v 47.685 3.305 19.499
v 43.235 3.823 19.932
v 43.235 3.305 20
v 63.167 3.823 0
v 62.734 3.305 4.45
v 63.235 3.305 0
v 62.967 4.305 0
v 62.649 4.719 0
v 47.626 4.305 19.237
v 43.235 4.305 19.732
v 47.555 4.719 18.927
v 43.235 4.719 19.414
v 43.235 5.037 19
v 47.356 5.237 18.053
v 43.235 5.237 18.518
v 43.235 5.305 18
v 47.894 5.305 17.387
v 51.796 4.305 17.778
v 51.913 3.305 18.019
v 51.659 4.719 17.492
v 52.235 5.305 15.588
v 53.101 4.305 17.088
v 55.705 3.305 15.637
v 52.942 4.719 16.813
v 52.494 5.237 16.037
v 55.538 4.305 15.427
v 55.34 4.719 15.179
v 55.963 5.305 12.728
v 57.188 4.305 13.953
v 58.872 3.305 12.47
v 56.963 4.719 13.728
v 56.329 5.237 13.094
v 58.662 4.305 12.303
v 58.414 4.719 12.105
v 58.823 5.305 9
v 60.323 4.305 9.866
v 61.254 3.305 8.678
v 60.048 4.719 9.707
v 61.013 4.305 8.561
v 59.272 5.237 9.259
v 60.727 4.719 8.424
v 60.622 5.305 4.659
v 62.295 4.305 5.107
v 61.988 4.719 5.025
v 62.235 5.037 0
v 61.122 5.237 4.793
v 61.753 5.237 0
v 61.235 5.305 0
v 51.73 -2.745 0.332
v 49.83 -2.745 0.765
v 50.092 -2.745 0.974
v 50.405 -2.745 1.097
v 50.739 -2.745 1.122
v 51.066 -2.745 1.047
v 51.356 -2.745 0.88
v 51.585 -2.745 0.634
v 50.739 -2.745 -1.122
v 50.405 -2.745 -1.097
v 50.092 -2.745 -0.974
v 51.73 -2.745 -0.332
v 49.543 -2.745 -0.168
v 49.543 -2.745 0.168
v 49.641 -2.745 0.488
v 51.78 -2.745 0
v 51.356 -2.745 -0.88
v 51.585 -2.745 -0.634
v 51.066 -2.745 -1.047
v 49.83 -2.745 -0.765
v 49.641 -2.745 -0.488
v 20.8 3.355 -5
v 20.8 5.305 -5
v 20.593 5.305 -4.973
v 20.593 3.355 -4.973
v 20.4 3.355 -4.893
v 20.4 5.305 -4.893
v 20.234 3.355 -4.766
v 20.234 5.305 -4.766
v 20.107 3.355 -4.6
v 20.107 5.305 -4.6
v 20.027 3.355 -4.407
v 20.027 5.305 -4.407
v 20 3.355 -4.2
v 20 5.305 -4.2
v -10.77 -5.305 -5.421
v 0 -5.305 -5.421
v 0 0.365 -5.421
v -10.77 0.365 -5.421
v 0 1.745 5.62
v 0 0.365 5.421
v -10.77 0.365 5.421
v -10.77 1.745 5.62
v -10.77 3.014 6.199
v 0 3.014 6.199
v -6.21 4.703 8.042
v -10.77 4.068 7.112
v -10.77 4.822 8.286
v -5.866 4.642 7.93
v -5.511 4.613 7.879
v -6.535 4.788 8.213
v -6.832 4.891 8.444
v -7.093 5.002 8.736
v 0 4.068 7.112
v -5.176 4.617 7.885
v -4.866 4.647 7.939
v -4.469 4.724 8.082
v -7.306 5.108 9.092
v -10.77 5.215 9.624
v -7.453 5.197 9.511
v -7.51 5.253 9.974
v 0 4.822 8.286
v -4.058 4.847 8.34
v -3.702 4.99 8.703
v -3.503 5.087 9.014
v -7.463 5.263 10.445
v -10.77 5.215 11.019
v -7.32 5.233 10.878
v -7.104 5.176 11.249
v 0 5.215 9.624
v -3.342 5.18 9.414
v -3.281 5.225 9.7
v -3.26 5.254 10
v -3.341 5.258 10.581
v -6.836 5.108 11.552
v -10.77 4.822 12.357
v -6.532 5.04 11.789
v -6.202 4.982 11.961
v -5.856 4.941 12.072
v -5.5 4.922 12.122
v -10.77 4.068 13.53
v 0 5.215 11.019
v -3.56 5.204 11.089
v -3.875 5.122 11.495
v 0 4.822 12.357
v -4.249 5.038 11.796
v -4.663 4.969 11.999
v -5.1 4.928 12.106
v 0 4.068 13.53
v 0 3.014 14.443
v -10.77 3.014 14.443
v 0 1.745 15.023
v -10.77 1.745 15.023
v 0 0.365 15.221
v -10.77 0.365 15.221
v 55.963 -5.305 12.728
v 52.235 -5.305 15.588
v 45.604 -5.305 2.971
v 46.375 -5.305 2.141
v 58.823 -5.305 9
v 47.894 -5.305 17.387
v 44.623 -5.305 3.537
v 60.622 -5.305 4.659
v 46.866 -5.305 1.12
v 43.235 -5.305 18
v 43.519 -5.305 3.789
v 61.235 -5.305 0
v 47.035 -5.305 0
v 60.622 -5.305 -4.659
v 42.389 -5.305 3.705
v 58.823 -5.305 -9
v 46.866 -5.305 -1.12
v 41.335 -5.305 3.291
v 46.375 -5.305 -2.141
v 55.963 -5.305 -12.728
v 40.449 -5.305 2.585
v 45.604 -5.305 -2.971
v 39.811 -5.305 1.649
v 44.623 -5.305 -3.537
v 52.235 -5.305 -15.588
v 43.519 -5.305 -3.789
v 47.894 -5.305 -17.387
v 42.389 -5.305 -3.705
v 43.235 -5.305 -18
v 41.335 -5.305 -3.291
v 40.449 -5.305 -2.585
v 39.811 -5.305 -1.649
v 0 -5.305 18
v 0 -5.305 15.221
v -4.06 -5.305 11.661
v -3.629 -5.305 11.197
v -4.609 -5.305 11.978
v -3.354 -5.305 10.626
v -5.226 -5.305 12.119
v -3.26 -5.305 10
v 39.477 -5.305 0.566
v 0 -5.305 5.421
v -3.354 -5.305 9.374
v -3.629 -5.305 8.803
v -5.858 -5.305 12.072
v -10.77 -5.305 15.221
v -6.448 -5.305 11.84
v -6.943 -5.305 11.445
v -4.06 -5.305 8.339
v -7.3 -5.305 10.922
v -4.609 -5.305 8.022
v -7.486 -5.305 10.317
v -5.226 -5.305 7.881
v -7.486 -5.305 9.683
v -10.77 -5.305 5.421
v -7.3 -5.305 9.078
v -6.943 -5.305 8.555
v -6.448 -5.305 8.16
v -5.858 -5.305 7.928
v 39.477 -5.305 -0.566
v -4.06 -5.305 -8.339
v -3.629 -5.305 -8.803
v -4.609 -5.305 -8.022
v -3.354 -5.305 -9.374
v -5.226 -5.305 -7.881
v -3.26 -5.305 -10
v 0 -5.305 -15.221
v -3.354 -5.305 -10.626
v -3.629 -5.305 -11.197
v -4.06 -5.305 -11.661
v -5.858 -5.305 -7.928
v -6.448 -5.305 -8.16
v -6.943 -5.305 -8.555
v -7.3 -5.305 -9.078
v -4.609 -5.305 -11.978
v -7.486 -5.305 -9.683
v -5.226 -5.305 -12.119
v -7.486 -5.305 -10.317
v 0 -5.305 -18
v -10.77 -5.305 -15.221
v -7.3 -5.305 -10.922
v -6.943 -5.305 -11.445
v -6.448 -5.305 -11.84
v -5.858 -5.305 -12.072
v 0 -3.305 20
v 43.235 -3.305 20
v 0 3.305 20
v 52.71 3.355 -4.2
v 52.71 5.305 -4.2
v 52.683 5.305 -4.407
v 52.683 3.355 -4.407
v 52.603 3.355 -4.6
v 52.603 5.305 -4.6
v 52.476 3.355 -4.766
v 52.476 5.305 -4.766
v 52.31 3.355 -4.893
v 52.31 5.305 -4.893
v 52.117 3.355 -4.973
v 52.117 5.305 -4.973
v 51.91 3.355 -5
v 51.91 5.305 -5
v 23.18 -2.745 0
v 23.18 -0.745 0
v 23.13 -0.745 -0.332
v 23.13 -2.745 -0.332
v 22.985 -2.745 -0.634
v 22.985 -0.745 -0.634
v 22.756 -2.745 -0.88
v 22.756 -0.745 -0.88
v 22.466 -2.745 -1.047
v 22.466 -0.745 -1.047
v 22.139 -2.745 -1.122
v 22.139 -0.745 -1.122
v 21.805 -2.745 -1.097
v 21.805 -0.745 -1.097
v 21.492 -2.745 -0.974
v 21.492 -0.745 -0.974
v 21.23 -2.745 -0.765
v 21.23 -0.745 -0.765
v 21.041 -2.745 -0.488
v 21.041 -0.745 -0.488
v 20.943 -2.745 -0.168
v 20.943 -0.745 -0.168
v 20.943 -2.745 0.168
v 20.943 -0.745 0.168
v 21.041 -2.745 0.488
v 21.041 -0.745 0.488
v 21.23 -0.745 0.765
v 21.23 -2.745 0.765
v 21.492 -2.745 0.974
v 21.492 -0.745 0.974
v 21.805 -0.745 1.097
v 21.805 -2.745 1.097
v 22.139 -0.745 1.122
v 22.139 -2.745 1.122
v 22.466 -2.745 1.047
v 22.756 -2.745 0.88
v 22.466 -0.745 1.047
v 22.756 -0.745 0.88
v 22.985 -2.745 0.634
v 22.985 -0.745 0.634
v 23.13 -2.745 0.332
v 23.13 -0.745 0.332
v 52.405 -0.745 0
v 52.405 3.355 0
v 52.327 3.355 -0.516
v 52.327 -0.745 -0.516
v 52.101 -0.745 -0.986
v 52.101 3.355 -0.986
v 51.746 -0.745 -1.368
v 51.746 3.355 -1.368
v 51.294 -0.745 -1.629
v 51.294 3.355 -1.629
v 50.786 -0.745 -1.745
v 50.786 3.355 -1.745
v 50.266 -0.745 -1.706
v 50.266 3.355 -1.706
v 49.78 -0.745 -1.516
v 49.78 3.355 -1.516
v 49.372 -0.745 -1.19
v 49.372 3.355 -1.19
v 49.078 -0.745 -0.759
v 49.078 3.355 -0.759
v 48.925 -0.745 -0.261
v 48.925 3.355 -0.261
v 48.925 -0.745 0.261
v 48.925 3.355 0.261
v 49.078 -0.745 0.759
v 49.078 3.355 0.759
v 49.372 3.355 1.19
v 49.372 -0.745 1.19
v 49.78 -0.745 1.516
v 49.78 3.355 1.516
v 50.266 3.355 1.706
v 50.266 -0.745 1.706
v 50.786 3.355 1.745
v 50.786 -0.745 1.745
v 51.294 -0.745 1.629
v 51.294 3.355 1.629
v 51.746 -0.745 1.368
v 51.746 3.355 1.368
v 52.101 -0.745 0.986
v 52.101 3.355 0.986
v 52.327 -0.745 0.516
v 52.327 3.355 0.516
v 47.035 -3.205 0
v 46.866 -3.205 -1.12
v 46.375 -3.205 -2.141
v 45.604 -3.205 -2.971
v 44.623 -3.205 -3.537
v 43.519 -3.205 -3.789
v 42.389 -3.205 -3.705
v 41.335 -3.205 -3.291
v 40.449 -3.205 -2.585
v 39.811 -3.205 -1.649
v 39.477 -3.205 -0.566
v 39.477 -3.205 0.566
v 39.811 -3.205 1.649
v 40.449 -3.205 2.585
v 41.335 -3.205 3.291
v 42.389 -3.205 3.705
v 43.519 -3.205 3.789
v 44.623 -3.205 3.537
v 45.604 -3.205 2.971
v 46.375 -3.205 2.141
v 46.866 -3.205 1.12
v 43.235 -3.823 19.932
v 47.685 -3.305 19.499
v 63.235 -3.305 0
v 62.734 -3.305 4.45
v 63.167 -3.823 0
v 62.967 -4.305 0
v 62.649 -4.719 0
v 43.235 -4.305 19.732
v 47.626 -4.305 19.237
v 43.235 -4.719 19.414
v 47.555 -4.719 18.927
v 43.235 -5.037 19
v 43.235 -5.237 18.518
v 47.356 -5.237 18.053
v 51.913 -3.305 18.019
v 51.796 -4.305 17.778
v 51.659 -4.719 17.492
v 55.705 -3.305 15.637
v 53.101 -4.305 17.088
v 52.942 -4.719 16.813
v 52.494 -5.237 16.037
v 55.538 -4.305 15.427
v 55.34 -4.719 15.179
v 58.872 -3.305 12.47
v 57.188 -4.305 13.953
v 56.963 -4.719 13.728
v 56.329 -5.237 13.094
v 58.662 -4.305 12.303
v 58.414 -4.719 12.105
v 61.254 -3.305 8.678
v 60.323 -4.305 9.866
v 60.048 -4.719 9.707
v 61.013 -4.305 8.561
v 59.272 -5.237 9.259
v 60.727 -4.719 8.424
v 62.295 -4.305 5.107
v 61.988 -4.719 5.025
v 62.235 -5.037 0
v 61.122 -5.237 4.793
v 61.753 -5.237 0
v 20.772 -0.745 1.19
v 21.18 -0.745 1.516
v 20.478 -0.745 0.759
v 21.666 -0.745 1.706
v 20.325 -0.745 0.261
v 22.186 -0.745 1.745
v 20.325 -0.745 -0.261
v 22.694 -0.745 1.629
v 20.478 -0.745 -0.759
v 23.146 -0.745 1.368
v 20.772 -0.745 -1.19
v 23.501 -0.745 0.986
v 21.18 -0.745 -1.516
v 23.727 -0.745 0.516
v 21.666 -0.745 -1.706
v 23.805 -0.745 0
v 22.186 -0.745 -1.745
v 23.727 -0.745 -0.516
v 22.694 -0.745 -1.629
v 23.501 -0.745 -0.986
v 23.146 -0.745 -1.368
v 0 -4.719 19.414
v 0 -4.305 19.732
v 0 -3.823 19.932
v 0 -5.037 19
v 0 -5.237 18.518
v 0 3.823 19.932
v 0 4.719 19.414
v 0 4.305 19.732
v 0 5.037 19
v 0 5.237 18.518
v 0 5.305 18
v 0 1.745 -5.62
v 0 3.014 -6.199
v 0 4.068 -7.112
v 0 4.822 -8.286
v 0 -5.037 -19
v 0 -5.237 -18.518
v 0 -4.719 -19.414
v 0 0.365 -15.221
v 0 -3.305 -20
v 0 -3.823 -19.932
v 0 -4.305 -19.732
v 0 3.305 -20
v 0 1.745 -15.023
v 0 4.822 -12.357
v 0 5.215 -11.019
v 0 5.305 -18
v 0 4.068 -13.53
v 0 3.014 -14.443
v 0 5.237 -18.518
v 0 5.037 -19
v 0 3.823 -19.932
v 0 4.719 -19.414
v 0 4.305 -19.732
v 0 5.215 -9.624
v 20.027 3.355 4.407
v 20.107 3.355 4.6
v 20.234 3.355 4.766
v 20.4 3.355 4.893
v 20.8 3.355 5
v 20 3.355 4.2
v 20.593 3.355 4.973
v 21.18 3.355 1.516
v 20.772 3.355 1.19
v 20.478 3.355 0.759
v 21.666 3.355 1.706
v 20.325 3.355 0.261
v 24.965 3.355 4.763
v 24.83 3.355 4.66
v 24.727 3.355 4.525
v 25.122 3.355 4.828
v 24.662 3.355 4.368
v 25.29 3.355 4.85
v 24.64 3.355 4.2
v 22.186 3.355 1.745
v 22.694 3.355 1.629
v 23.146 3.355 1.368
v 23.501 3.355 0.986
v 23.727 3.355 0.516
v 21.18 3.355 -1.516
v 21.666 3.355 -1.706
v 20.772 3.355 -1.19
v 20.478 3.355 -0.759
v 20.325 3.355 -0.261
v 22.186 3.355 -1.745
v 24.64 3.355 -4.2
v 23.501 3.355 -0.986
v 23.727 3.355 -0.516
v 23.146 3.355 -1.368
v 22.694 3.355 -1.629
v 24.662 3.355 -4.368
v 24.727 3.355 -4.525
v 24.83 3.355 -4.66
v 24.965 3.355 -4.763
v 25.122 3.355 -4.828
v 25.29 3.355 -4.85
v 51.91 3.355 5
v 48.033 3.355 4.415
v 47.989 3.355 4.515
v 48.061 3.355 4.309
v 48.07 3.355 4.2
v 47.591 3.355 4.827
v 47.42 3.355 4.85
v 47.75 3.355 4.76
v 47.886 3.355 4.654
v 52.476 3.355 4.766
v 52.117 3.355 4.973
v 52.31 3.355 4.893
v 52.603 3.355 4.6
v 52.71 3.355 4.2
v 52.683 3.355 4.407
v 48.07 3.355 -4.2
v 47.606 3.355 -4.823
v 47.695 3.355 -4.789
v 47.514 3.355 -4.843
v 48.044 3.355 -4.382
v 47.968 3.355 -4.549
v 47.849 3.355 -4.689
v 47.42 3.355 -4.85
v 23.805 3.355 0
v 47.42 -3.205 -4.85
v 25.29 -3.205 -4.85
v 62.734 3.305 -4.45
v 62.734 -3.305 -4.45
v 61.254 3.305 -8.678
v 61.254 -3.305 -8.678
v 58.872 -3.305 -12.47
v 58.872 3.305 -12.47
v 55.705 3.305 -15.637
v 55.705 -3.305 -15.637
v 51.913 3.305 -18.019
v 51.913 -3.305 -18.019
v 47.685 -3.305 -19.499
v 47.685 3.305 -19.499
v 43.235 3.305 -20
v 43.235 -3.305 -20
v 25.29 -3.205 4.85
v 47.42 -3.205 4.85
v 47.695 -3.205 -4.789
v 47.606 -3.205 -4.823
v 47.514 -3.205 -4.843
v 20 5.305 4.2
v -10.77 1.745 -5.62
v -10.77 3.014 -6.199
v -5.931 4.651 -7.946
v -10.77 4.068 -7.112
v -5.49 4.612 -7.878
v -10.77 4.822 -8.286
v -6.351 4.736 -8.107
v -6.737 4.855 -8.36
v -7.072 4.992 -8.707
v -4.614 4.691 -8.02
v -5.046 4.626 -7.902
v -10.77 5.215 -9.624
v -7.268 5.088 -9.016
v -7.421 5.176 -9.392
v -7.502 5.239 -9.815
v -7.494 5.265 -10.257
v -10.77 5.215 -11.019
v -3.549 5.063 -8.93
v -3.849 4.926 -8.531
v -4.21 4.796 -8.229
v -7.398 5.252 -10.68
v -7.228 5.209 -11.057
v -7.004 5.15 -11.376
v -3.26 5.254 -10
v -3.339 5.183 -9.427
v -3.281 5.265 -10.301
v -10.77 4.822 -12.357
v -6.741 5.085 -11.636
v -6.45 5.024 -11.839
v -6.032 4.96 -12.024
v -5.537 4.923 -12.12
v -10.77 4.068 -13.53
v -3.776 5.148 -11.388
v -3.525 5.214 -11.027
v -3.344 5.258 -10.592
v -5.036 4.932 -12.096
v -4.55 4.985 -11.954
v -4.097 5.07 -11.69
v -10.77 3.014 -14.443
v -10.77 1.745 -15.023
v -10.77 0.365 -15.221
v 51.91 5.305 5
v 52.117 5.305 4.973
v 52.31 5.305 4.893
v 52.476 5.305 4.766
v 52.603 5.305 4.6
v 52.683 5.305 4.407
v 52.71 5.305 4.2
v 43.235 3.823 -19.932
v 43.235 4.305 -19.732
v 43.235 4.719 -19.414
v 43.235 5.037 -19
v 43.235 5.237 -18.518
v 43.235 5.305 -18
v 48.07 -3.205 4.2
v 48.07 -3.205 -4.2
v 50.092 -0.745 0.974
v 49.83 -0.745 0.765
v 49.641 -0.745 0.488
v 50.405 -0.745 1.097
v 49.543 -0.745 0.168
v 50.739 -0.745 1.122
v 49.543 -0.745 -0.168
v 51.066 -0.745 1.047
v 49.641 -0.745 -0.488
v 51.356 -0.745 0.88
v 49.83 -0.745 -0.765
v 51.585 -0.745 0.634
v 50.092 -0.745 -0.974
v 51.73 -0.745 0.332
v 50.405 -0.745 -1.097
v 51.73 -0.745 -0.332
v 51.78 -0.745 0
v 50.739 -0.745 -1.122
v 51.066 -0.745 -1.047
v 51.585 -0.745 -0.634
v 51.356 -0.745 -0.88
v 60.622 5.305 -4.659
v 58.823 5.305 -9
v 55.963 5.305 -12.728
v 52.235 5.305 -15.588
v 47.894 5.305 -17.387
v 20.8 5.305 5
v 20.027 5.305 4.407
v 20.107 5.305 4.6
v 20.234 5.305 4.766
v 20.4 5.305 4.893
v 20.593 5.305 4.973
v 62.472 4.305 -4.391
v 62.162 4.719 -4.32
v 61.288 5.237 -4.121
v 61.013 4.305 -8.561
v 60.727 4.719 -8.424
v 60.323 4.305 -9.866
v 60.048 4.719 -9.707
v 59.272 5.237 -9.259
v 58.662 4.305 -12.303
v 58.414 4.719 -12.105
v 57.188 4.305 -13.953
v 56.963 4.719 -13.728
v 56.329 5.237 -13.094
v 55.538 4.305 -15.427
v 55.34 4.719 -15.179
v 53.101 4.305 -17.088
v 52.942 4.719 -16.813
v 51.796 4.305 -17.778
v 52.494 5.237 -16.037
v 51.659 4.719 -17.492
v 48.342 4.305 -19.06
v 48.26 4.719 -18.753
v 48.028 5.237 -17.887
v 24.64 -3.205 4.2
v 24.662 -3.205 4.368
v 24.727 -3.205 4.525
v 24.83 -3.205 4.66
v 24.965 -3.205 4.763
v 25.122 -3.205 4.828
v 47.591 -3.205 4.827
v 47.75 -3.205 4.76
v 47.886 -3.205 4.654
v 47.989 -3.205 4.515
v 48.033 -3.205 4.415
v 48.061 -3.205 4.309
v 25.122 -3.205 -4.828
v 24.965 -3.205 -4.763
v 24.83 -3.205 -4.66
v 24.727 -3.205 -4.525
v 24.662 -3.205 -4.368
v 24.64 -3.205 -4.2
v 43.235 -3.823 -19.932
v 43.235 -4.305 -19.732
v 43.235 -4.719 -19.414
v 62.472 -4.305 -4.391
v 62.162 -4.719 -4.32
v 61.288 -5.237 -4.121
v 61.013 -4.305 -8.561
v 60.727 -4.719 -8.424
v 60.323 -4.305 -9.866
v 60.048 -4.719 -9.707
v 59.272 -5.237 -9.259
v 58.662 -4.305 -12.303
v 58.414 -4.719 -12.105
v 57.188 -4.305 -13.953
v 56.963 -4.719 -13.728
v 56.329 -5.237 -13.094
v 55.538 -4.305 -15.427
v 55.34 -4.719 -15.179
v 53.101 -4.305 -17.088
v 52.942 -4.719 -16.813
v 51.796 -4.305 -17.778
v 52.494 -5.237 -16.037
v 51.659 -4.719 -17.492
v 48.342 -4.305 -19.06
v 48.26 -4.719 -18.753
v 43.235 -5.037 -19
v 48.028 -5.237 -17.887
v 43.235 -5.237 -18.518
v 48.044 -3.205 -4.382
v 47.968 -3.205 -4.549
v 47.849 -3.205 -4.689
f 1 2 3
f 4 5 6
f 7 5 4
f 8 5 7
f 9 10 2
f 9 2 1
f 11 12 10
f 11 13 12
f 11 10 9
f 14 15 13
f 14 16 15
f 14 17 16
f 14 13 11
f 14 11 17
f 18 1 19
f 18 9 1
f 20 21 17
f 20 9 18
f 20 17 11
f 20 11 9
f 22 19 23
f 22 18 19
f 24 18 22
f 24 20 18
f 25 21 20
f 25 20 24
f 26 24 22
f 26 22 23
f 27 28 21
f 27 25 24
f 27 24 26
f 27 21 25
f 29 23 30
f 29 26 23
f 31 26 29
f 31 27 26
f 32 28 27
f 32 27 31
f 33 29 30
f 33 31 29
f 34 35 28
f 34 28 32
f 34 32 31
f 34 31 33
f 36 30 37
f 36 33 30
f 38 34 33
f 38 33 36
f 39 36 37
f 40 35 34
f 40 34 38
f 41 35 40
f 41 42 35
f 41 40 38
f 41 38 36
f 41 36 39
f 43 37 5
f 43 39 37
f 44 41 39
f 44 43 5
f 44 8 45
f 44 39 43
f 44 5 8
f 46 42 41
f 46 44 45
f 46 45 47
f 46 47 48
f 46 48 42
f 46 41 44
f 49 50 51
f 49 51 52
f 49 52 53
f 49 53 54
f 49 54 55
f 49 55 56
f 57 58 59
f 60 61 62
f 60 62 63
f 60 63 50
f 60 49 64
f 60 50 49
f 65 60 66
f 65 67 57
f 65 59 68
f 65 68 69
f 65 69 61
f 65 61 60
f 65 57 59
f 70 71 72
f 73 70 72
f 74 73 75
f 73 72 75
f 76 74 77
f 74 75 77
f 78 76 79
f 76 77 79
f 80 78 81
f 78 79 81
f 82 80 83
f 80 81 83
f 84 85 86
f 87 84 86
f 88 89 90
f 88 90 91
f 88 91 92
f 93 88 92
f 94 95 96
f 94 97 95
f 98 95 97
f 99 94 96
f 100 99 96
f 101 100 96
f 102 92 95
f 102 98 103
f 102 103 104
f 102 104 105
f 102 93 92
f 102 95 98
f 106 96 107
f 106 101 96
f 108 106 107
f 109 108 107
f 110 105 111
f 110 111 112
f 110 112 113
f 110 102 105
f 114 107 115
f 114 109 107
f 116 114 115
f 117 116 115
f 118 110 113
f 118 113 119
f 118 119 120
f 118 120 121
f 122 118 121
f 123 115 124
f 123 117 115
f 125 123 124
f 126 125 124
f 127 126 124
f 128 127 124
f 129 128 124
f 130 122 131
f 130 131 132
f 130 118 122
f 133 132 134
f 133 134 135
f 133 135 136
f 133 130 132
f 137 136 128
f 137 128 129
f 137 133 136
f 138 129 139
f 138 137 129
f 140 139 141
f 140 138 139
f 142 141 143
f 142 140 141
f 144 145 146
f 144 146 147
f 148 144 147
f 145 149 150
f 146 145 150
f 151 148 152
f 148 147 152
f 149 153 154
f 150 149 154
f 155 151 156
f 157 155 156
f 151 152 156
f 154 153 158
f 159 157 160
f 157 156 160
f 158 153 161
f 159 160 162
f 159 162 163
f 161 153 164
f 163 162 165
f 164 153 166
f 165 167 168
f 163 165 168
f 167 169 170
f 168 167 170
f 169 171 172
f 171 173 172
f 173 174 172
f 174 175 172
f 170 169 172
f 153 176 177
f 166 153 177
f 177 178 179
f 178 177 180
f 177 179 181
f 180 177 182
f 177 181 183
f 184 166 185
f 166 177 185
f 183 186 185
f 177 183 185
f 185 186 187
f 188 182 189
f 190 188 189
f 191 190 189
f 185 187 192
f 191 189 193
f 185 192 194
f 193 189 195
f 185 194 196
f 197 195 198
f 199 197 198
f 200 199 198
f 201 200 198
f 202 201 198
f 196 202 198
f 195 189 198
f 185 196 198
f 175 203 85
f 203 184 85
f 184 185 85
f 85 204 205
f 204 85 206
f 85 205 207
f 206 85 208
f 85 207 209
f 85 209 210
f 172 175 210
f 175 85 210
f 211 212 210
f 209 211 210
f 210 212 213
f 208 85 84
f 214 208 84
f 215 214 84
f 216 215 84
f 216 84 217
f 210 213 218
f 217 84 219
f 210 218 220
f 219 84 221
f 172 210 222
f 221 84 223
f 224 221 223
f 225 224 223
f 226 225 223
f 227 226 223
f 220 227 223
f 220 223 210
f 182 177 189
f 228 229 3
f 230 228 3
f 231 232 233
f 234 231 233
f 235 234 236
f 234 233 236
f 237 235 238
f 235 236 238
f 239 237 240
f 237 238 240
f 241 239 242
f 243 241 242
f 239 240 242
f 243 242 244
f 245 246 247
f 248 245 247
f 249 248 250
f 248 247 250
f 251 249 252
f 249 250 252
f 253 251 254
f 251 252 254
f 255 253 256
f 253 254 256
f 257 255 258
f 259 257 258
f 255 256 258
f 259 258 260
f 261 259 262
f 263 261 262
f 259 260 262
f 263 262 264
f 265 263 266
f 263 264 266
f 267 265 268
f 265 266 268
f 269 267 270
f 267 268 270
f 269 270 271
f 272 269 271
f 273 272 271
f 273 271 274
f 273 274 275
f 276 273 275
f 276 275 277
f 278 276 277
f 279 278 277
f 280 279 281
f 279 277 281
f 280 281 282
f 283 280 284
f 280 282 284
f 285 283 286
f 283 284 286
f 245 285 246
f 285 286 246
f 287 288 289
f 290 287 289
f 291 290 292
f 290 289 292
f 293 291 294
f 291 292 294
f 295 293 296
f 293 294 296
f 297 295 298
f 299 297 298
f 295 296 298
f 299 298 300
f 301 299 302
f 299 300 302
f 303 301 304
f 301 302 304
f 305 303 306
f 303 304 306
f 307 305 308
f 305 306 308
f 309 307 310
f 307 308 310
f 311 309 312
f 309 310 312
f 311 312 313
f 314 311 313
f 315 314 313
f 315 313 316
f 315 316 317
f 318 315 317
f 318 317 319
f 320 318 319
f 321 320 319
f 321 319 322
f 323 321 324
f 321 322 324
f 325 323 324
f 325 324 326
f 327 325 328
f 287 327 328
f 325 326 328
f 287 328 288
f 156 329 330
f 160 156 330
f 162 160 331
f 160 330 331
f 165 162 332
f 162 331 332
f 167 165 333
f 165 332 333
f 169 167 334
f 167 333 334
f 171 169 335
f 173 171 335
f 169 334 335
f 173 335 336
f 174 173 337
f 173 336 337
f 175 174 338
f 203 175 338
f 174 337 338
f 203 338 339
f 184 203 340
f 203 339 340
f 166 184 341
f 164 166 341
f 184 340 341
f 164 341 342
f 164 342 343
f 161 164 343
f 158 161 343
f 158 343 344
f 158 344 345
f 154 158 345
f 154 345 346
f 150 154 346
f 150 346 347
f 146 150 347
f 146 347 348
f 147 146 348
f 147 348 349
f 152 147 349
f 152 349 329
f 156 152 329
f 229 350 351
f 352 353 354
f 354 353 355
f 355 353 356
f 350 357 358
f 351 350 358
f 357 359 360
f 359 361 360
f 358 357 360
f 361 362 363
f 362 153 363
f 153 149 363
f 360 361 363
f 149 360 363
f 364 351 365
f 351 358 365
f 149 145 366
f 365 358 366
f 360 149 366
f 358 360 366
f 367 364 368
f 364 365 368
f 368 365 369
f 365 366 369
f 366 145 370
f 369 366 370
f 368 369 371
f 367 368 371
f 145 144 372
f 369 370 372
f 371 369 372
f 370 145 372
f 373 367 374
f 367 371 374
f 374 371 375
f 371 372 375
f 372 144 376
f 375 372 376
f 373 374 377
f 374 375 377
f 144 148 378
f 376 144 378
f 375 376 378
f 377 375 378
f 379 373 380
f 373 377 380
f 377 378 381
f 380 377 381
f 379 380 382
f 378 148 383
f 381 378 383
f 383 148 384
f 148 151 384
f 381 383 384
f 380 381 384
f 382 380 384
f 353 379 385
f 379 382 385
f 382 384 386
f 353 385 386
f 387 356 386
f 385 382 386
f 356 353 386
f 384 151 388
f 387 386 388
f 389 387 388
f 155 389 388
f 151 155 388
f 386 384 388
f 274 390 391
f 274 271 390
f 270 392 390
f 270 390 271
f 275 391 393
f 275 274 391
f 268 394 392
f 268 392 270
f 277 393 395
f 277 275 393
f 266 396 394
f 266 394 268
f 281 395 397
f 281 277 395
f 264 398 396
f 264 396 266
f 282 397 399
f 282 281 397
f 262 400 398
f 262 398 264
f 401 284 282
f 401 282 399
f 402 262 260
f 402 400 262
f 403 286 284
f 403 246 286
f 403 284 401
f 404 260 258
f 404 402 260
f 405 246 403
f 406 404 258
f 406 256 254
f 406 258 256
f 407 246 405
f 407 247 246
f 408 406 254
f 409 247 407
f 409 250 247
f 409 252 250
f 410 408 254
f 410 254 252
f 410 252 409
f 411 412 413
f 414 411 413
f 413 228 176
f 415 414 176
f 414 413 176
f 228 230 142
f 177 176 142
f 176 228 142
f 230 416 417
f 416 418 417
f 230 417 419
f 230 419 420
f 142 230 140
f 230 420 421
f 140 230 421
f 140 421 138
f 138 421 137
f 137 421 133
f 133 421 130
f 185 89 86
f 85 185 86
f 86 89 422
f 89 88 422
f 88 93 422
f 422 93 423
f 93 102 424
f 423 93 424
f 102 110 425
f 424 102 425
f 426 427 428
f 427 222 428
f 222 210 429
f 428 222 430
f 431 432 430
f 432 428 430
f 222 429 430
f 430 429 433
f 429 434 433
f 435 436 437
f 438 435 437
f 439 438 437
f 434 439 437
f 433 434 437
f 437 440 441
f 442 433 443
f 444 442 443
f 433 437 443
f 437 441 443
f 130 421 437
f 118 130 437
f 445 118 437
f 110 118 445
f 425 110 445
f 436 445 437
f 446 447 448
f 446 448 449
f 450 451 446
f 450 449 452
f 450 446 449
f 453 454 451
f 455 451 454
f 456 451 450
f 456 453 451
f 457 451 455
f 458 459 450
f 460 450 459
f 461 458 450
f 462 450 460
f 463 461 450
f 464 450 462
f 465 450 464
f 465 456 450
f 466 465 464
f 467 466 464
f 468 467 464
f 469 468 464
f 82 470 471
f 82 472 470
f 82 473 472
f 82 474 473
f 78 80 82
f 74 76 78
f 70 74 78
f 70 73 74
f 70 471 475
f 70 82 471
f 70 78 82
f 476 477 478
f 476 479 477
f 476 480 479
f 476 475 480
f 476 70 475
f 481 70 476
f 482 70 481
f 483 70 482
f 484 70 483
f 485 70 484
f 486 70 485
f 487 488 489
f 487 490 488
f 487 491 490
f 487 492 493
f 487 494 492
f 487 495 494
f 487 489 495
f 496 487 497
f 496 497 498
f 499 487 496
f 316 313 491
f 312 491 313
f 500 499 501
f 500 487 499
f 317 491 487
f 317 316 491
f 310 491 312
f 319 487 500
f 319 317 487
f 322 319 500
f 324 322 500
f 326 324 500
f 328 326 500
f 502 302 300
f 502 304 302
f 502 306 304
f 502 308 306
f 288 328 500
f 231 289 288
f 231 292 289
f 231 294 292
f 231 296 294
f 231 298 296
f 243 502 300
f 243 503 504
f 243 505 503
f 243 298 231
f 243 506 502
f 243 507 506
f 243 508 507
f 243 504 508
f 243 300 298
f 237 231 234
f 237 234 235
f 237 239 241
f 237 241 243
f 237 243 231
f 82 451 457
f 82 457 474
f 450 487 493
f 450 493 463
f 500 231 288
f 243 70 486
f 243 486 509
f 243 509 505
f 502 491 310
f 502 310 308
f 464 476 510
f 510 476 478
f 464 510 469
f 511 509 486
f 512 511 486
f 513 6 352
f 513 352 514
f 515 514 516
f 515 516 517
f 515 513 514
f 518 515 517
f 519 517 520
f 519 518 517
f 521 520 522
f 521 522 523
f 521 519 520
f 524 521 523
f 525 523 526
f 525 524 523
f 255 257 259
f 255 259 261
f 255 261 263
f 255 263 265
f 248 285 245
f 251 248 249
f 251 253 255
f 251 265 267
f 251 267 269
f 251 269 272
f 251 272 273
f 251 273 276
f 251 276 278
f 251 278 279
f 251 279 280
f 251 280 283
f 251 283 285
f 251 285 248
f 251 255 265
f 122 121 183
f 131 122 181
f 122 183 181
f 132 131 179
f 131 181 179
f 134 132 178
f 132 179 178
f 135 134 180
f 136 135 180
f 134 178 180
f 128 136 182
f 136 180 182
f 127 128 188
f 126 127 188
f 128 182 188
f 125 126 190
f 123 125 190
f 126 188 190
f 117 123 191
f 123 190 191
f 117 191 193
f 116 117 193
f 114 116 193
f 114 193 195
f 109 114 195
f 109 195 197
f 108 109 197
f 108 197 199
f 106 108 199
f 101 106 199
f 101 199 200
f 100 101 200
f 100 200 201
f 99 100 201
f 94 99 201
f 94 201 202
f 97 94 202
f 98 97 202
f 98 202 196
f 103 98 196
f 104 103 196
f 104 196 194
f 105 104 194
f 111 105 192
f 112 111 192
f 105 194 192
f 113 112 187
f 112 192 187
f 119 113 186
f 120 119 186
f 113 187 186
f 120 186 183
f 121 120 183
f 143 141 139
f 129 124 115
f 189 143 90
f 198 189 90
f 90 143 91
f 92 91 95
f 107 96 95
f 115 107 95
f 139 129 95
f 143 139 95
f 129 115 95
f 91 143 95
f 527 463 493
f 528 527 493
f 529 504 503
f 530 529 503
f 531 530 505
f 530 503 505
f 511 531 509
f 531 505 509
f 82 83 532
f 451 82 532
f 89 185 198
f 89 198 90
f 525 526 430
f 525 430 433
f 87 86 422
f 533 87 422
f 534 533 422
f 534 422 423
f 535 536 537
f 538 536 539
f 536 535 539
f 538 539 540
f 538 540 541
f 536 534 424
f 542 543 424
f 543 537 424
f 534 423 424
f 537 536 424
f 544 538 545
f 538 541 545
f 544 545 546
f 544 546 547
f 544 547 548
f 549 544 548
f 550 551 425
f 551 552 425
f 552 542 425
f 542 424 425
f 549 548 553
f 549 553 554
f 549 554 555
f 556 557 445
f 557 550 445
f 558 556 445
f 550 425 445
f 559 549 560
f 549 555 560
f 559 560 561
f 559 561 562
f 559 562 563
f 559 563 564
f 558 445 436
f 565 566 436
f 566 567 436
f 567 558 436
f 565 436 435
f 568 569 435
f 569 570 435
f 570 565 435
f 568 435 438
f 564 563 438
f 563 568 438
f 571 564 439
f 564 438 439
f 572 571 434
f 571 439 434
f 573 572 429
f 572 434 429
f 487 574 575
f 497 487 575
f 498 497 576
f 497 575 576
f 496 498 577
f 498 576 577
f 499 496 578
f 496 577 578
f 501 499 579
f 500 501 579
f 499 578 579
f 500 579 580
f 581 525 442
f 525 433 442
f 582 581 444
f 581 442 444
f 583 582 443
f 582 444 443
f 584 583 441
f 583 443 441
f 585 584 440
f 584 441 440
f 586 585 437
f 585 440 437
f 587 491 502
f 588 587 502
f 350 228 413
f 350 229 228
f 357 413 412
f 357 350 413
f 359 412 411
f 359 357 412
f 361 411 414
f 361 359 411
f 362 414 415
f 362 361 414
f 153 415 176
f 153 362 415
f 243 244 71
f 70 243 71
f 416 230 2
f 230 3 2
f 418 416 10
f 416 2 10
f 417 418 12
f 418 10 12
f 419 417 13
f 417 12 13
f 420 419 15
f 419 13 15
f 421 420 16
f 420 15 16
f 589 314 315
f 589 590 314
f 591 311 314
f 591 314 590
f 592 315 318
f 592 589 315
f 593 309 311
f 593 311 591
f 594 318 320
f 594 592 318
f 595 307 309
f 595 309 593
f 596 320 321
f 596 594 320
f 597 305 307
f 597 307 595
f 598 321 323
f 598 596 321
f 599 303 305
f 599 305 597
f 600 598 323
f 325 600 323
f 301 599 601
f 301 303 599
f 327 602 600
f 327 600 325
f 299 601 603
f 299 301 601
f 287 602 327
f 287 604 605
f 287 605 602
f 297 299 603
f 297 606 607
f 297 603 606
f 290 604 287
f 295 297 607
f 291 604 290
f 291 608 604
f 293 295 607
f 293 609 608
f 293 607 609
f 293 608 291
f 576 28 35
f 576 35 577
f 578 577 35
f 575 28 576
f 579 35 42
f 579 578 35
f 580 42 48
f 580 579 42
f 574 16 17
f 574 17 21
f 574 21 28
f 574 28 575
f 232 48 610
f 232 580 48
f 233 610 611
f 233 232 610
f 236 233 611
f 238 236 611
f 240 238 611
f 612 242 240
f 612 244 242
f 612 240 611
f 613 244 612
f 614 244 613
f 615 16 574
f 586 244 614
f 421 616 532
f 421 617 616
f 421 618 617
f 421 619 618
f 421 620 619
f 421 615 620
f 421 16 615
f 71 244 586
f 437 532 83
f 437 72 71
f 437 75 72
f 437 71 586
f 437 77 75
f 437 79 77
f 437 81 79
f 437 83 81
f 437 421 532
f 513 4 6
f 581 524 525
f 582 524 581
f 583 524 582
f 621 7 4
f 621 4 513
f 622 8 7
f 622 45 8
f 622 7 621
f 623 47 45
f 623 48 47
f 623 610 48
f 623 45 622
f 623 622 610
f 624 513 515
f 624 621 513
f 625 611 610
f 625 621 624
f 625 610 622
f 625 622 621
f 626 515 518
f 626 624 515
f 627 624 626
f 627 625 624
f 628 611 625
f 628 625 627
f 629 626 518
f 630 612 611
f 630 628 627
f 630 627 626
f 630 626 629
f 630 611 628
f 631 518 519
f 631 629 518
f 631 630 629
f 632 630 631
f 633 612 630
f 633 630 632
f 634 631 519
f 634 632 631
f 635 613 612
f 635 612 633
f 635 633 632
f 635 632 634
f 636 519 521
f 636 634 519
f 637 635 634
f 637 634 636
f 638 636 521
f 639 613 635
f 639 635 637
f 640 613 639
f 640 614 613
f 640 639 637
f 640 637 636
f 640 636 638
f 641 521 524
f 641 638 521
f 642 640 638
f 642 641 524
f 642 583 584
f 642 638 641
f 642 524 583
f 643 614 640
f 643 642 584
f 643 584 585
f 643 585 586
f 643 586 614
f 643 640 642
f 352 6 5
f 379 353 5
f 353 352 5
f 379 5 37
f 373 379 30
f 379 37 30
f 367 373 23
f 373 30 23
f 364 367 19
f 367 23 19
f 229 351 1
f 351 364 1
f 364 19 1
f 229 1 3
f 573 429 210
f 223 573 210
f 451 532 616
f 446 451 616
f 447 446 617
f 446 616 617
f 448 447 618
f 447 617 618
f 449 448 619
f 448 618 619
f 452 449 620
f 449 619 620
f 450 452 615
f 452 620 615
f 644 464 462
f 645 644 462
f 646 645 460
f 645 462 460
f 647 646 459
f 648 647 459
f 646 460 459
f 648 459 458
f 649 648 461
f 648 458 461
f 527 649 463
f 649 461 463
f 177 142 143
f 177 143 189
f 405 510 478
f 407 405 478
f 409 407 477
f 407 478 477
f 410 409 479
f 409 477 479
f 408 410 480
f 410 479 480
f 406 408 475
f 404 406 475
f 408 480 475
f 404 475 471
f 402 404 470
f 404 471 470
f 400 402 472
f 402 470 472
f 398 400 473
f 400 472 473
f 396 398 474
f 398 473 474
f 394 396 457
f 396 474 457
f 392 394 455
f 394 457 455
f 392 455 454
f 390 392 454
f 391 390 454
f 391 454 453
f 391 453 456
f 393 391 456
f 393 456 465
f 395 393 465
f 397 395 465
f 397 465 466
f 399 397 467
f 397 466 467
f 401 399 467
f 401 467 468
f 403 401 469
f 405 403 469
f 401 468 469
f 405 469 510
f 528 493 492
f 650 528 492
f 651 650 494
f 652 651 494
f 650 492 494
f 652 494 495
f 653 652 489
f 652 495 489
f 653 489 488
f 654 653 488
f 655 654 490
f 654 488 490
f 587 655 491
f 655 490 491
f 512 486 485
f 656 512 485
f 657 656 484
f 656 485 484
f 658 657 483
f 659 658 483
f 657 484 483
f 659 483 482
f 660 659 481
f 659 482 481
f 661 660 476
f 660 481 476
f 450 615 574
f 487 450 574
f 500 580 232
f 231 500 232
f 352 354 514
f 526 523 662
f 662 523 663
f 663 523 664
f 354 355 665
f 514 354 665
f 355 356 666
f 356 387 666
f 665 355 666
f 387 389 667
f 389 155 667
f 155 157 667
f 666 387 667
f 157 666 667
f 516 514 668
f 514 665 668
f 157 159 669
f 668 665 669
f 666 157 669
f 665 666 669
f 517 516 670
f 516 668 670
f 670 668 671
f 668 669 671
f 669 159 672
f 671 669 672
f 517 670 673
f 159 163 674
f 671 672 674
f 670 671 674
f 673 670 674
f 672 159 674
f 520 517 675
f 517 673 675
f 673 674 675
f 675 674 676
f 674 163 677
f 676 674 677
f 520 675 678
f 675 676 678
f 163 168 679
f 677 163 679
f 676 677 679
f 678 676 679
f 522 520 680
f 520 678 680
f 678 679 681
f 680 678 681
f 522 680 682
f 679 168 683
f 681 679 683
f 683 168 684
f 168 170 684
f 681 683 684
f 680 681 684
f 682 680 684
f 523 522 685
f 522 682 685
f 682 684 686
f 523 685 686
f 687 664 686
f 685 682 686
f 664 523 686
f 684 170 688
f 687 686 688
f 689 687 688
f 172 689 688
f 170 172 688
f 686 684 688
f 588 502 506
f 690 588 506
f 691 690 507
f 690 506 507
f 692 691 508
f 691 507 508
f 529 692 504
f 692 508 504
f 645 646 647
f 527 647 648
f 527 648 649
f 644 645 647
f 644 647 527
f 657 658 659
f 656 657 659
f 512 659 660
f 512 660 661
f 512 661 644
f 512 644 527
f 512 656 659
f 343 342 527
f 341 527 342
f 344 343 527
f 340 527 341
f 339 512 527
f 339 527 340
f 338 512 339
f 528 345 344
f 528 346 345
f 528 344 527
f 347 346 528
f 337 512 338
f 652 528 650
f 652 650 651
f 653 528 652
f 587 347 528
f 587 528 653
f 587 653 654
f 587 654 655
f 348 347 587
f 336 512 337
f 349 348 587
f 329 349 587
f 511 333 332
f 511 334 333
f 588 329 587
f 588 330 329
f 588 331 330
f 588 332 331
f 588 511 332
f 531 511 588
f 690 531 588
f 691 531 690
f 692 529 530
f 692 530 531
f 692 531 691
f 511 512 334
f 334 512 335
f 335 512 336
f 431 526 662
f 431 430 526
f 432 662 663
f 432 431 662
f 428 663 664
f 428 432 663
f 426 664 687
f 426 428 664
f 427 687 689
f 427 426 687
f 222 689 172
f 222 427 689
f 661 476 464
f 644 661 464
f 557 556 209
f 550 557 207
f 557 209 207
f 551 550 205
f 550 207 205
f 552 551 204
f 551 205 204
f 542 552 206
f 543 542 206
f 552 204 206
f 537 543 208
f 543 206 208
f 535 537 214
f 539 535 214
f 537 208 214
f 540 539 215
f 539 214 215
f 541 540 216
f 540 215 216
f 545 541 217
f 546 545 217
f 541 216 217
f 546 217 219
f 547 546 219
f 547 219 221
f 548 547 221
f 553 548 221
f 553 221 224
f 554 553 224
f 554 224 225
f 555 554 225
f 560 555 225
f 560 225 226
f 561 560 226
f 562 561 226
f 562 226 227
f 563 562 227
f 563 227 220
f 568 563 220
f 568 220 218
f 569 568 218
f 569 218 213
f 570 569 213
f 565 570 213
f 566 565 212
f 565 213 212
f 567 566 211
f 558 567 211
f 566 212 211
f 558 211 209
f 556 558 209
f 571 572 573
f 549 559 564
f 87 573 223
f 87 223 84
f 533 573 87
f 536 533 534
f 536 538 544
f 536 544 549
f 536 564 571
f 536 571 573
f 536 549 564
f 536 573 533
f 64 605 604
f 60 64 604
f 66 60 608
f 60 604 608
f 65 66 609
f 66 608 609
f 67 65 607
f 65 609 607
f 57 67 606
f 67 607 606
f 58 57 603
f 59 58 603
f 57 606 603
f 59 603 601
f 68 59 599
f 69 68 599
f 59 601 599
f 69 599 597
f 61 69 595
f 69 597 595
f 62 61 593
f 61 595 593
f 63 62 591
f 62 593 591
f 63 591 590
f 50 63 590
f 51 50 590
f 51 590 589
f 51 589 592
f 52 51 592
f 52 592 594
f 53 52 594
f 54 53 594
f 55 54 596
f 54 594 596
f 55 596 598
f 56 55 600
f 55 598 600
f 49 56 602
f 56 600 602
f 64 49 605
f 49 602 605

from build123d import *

# Parameters (mm, degrees)
SKETCH1_W           = 40
SKETCH1_H           = 10.610001376
BOSS_EXTRUDE1_DEPTH = 63.235
CUT_EXTRUDE1_DEPTH  = 11.610001375
CUT_EXTRUDE2_DEPTH  = 1.95
CUT_EXTRUDE3_DEPTH  = 6.56
SKETCH5_R           = 3.8
CUT_EXTRUDE4_DEPTH  = 3.100001375
SKETCH6_R           = 1.75
CUT_EXTRUDE5_DEPTH  = 4.1
SKETCH7_R           = 1.125
CUT_EXTRUDE6_DEPTH  = 2
FILLET1_R           = 2
BOSS_EXTRUDE2_DEPTH = 10.77
SKETCH9_R           = 2.125
CUT_EXTRUDE7_DEPTH  = 11.610001375


with BuildPart() as part:
    # Sketch1 → Boss-Extrude1 (new body)
    with BuildSketch(Plane(origin=(0, 0, 0), x_dir=(0, 0, -1), z_dir=(1, 0, 0))):
        Rectangle(SKETCH1_W, SKETCH1_H)
    extrude(amount=BOSS_EXTRUDE1_DEPTH)

    # Sketch2 → Cut-Extrude1 (cut, through all)
    with BuildSketch(Plane(origin=(0, 5.305000688, 0), x_dir=(1, 0, 0), z_dir=(0, 1, 0))):
        with BuildLine():
            Line((63.235, -20), (63.235, 0))
            ThreePointArc((63.235, 0), (57.377135624, -14.142135624), (43.235, -20))
            Line((43.235, -20), (63.235, -20))
        make_face()
    cut_extrude1 = extrude(amount=-CUT_EXTRUDE1_DEPTH, mode=Mode.SUBTRACT)

    # Mirror1: Cut-Extrude1 across plane
    add(cut_extrude1.mirror(Plane.XY), mode=Mode.SUBTRACT)

    # Sketch3 → Cut-Extrude2 (cut)
    with BuildSketch(Plane(origin=(0, 5.305000688, 0), x_dir=(1, 0, 0), z_dir=(0, 1, 0))):
        with BuildLine():
            Line((20, 4.2), (20, -4.2))
            ThreePointArc((20, -4.2), (20.234314575, -4.765685425), (20.8, -5))
            Line((20.8, -5), (31.17, -5))
            Line((31.17, -5), (41.54, -5))
            Line((41.54, -5), (51.91, -5))
            ThreePointArc((51.91, -5), (52.475685425, -4.765685425), (52.71, -4.2))
            Line((52.71, -4.2), (52.71, 4.2))
            ThreePointArc((52.71, 4.2), (52.475685425, 4.765685425), (51.91, 5))
            Line((51.91, 5), (41.54, 5))
            Line((41.54, 5), (31.17, 5))
            Line((31.17, 5), (20.8, 5))
            ThreePointArc((20.8, 5), (20.234314575, 4.765685425), (20, 4.2))
        make_face()
    extrude(amount=-CUT_EXTRUDE2_DEPTH, mode=Mode.SUBTRACT)

    # Sketch4 → Cut-Extrude3 (cut)
    with BuildSketch(Plane(origin=(0, 3.355000688, 0), x_dir=(1, 0, 0), z_dir=(0, 1, 0))):
        with BuildLine():
            Line((48.07, -4.2), (48.07, 4.2))
            ThreePointArc((48.07, 4.2), (47.968188406, 4.549269911), (47.694647782, 4.78912528))
            ThreePointArc((47.694647782, 4.78912528), (47.560656617, 4.834598862), (47.42, 4.85))
            Line((47.42, 4.85), (25.29, 4.85))
            ThreePointArc((25.29, 4.85), (24.830380592, 4.659619408), (24.64, 4.2))
            Line((24.64, 4.2), (24.64, -4.2))
            ThreePointArc((24.64, -4.2), (24.830380592, -4.659619408), (25.29, -4.85))
            Line((25.29, -4.85), (47.42, -4.85))
            ThreePointArc((47.42, -4.85), (47.749899473, -4.760059227), (47.988502289, -4.515127192))
            ThreePointArc((47.988502289, -4.515127192), (48.049295832, -4.362747522), (48.07, -4.2))
        make_face()
    extrude(amount=-CUT_EXTRUDE3_DEPTH, mode=Mode.SUBTRACT)

    # Sketch5 → Cut-Extrude4 (cut, through all)
    with BuildSketch(Plane(origin=(0, -3.204999312, 0), x_dir=(1, 0, 0), z_dir=(0, 1, 0))):
        with Locations((43.235, 0)):
            Circle(SKETCH5_R)
    extrude(amount=-CUT_EXTRUDE4_DEPTH, mode=Mode.SUBTRACT)

    # Sketch6 → Cut-Extrude5 (cut)
    with BuildSketch(Plane(origin=(0, 3.355000688, 0), x_dir=(1, 0, 0), z_dir=(0, 1, 0))):
        with Locations((50.655, 0)):
            Circle(SKETCH6_R)
        with Locations((22.055, 0)):
            Circle(SKETCH6_R)
    extrude(amount=-CUT_EXTRUDE5_DEPTH, mode=Mode.SUBTRACT)

    # Sketch7 → Cut-Extrude6 (cut)
    with BuildSketch(Plane(origin=(0, -0.744999312, 0), x_dir=(1, 0, 0), z_dir=(0, 1, 0))):
        with Locations((50.655, 0)):
            Circle(SKETCH7_R)
        with Locations((22.055, 0)):
            Circle(SKETCH7_R)
    extrude(amount=-CUT_EXTRUDE6_DEPTH, mode=Mode.SUBTRACT)

    # Fillet1
    fillet1_edges = [part.edges().sort_by_distance(p)[0] for p in [
        (21.6175, 5.305000688, 20),
        (21.6175, -5.305000688, 20),
        (63.235, -5.305000688, 0),
        (63.235, 5.305000688, 0),
        (21.6175, 5.305000688, -20),
        (21.6175, -5.305000688, -20),
    ]]
    fillet(fillet1_edges, radius=FILLET1_R)

    # Sketch8 → Boss-Extrude2 (add)
    with BuildSketch(Plane.ZY):
        with BuildLine():
            Line((-15.221247138, 0.365000688), (-15.221247138, -5.305000688))
            Line((-15.221247138, -5.305000688), (-5.421247138, -5.305000688))
            Line((-5.421247138, -5.305000688), (-5.421247138, 0.365000688))
            ThreePointArc((-5.421247138, 0.365000688), (-10.321247138, 5.265000688), (-15.221247138, 0.365000688))
        make_face()
        with BuildLine():
            Line((15.221247138, 0.365000688), (15.221247138, -5.305000688))
            Line((15.221247138, -5.305000688), (5.421247138, -5.305000688))
            Line((5.421247138, -5.305000688), (5.421247138, 0.365000688))
            ThreePointArc((5.421247138, 0.365000688), (10.321247138, 5.265000688), (15.221247138, 0.365000688))
        make_face()
    extrude(amount=BOSS_EXTRUDE2_DEPTH)

    # Sketch9 → Cut-Extrude7 (cut, through all)
    with BuildSketch(Plane.XZ.offset(5.305000688)):
        with Locations((-5.385, 10)):
            Circle(SKETCH9_R)
        with Locations((-5.385, -10)):
            Circle(SKETCH9_R)
    extrude(amount=-CUT_EXTRUDE7_DEPTH, mode=Mode.SUBTRACT)


solid = part.part
